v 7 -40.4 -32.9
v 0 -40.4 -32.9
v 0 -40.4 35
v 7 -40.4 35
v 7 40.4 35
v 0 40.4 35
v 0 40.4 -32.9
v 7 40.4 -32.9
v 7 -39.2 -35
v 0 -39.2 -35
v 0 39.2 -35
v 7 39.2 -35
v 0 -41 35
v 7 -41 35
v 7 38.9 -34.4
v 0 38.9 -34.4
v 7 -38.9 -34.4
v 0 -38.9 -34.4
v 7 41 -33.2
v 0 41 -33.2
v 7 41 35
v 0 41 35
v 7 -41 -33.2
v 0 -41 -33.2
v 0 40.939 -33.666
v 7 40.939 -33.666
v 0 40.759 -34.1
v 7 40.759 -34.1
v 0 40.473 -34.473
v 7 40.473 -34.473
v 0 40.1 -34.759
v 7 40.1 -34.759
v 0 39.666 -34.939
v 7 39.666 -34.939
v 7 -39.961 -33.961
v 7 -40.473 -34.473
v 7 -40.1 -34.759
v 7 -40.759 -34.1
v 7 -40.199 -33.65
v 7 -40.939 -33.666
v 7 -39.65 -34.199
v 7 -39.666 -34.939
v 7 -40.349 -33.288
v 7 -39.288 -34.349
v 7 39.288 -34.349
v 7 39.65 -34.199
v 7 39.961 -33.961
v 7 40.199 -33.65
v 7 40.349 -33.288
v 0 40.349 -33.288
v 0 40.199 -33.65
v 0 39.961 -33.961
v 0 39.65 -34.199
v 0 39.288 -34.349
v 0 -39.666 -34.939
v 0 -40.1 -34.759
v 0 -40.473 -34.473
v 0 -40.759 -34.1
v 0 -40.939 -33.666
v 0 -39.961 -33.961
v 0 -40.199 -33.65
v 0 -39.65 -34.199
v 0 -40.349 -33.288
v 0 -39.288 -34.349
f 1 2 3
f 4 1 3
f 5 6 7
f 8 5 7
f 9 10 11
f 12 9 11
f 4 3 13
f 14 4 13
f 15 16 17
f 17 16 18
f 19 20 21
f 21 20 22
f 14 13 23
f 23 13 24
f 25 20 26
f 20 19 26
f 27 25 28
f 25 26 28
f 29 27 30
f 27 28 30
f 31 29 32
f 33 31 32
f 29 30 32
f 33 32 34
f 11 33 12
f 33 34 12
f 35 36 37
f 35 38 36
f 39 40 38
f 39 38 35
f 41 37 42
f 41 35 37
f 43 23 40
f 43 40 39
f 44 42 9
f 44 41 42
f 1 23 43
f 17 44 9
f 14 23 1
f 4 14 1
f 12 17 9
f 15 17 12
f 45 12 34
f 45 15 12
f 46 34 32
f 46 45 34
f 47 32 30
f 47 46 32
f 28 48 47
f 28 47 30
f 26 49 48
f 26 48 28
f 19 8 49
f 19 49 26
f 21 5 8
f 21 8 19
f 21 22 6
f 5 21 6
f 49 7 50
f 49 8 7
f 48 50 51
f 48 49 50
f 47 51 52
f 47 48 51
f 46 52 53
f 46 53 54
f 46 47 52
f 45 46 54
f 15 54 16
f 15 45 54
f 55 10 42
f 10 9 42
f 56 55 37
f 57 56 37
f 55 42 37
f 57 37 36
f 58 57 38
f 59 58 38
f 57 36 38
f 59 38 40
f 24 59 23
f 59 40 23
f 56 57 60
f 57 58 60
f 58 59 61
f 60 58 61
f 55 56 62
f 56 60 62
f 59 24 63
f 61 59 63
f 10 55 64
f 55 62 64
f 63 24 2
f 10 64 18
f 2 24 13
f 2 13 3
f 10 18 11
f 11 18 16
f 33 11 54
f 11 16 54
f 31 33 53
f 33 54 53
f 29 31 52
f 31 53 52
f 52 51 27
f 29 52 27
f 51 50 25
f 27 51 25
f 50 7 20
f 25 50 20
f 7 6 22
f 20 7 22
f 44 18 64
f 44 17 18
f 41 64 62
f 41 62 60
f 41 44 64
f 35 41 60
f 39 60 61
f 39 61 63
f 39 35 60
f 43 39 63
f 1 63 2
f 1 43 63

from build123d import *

# Parameters (mm, degrees)
F1_DEPTH = 7
F2_R     = 1.5
F3_R     = 1.8


with BuildPart() as f1:
    # F0 (on Right) → F1 (new body)
    with BuildSketch(Plane.YZ):
        Polygon((-40.4, 35), (-41, 35), (-41, -35), (41, -35), (41, 35), (40.4, 35), (40.4, -34.4), (-40.4, -34.4), align=None)
    extrude(amount=F1_DEPTH)

    # F2
    f2_edges = [f1.edges().sort_by_distance(p)[0] for p in [
        (3.5, -40.4, -34.4),
        (3.5, 40.4, -34.4),
    ]]
    fillet(f2_edges, radius=F2_R)

    # F3
    f3_edges = [f1.edges().sort_by_distance(p)[0] for p in [
        (3.5, -41, -35),
        (3.5, 41, -35),
    ]]
    fillet(f3_edges, radius=F3_R)


solid = f1.part
